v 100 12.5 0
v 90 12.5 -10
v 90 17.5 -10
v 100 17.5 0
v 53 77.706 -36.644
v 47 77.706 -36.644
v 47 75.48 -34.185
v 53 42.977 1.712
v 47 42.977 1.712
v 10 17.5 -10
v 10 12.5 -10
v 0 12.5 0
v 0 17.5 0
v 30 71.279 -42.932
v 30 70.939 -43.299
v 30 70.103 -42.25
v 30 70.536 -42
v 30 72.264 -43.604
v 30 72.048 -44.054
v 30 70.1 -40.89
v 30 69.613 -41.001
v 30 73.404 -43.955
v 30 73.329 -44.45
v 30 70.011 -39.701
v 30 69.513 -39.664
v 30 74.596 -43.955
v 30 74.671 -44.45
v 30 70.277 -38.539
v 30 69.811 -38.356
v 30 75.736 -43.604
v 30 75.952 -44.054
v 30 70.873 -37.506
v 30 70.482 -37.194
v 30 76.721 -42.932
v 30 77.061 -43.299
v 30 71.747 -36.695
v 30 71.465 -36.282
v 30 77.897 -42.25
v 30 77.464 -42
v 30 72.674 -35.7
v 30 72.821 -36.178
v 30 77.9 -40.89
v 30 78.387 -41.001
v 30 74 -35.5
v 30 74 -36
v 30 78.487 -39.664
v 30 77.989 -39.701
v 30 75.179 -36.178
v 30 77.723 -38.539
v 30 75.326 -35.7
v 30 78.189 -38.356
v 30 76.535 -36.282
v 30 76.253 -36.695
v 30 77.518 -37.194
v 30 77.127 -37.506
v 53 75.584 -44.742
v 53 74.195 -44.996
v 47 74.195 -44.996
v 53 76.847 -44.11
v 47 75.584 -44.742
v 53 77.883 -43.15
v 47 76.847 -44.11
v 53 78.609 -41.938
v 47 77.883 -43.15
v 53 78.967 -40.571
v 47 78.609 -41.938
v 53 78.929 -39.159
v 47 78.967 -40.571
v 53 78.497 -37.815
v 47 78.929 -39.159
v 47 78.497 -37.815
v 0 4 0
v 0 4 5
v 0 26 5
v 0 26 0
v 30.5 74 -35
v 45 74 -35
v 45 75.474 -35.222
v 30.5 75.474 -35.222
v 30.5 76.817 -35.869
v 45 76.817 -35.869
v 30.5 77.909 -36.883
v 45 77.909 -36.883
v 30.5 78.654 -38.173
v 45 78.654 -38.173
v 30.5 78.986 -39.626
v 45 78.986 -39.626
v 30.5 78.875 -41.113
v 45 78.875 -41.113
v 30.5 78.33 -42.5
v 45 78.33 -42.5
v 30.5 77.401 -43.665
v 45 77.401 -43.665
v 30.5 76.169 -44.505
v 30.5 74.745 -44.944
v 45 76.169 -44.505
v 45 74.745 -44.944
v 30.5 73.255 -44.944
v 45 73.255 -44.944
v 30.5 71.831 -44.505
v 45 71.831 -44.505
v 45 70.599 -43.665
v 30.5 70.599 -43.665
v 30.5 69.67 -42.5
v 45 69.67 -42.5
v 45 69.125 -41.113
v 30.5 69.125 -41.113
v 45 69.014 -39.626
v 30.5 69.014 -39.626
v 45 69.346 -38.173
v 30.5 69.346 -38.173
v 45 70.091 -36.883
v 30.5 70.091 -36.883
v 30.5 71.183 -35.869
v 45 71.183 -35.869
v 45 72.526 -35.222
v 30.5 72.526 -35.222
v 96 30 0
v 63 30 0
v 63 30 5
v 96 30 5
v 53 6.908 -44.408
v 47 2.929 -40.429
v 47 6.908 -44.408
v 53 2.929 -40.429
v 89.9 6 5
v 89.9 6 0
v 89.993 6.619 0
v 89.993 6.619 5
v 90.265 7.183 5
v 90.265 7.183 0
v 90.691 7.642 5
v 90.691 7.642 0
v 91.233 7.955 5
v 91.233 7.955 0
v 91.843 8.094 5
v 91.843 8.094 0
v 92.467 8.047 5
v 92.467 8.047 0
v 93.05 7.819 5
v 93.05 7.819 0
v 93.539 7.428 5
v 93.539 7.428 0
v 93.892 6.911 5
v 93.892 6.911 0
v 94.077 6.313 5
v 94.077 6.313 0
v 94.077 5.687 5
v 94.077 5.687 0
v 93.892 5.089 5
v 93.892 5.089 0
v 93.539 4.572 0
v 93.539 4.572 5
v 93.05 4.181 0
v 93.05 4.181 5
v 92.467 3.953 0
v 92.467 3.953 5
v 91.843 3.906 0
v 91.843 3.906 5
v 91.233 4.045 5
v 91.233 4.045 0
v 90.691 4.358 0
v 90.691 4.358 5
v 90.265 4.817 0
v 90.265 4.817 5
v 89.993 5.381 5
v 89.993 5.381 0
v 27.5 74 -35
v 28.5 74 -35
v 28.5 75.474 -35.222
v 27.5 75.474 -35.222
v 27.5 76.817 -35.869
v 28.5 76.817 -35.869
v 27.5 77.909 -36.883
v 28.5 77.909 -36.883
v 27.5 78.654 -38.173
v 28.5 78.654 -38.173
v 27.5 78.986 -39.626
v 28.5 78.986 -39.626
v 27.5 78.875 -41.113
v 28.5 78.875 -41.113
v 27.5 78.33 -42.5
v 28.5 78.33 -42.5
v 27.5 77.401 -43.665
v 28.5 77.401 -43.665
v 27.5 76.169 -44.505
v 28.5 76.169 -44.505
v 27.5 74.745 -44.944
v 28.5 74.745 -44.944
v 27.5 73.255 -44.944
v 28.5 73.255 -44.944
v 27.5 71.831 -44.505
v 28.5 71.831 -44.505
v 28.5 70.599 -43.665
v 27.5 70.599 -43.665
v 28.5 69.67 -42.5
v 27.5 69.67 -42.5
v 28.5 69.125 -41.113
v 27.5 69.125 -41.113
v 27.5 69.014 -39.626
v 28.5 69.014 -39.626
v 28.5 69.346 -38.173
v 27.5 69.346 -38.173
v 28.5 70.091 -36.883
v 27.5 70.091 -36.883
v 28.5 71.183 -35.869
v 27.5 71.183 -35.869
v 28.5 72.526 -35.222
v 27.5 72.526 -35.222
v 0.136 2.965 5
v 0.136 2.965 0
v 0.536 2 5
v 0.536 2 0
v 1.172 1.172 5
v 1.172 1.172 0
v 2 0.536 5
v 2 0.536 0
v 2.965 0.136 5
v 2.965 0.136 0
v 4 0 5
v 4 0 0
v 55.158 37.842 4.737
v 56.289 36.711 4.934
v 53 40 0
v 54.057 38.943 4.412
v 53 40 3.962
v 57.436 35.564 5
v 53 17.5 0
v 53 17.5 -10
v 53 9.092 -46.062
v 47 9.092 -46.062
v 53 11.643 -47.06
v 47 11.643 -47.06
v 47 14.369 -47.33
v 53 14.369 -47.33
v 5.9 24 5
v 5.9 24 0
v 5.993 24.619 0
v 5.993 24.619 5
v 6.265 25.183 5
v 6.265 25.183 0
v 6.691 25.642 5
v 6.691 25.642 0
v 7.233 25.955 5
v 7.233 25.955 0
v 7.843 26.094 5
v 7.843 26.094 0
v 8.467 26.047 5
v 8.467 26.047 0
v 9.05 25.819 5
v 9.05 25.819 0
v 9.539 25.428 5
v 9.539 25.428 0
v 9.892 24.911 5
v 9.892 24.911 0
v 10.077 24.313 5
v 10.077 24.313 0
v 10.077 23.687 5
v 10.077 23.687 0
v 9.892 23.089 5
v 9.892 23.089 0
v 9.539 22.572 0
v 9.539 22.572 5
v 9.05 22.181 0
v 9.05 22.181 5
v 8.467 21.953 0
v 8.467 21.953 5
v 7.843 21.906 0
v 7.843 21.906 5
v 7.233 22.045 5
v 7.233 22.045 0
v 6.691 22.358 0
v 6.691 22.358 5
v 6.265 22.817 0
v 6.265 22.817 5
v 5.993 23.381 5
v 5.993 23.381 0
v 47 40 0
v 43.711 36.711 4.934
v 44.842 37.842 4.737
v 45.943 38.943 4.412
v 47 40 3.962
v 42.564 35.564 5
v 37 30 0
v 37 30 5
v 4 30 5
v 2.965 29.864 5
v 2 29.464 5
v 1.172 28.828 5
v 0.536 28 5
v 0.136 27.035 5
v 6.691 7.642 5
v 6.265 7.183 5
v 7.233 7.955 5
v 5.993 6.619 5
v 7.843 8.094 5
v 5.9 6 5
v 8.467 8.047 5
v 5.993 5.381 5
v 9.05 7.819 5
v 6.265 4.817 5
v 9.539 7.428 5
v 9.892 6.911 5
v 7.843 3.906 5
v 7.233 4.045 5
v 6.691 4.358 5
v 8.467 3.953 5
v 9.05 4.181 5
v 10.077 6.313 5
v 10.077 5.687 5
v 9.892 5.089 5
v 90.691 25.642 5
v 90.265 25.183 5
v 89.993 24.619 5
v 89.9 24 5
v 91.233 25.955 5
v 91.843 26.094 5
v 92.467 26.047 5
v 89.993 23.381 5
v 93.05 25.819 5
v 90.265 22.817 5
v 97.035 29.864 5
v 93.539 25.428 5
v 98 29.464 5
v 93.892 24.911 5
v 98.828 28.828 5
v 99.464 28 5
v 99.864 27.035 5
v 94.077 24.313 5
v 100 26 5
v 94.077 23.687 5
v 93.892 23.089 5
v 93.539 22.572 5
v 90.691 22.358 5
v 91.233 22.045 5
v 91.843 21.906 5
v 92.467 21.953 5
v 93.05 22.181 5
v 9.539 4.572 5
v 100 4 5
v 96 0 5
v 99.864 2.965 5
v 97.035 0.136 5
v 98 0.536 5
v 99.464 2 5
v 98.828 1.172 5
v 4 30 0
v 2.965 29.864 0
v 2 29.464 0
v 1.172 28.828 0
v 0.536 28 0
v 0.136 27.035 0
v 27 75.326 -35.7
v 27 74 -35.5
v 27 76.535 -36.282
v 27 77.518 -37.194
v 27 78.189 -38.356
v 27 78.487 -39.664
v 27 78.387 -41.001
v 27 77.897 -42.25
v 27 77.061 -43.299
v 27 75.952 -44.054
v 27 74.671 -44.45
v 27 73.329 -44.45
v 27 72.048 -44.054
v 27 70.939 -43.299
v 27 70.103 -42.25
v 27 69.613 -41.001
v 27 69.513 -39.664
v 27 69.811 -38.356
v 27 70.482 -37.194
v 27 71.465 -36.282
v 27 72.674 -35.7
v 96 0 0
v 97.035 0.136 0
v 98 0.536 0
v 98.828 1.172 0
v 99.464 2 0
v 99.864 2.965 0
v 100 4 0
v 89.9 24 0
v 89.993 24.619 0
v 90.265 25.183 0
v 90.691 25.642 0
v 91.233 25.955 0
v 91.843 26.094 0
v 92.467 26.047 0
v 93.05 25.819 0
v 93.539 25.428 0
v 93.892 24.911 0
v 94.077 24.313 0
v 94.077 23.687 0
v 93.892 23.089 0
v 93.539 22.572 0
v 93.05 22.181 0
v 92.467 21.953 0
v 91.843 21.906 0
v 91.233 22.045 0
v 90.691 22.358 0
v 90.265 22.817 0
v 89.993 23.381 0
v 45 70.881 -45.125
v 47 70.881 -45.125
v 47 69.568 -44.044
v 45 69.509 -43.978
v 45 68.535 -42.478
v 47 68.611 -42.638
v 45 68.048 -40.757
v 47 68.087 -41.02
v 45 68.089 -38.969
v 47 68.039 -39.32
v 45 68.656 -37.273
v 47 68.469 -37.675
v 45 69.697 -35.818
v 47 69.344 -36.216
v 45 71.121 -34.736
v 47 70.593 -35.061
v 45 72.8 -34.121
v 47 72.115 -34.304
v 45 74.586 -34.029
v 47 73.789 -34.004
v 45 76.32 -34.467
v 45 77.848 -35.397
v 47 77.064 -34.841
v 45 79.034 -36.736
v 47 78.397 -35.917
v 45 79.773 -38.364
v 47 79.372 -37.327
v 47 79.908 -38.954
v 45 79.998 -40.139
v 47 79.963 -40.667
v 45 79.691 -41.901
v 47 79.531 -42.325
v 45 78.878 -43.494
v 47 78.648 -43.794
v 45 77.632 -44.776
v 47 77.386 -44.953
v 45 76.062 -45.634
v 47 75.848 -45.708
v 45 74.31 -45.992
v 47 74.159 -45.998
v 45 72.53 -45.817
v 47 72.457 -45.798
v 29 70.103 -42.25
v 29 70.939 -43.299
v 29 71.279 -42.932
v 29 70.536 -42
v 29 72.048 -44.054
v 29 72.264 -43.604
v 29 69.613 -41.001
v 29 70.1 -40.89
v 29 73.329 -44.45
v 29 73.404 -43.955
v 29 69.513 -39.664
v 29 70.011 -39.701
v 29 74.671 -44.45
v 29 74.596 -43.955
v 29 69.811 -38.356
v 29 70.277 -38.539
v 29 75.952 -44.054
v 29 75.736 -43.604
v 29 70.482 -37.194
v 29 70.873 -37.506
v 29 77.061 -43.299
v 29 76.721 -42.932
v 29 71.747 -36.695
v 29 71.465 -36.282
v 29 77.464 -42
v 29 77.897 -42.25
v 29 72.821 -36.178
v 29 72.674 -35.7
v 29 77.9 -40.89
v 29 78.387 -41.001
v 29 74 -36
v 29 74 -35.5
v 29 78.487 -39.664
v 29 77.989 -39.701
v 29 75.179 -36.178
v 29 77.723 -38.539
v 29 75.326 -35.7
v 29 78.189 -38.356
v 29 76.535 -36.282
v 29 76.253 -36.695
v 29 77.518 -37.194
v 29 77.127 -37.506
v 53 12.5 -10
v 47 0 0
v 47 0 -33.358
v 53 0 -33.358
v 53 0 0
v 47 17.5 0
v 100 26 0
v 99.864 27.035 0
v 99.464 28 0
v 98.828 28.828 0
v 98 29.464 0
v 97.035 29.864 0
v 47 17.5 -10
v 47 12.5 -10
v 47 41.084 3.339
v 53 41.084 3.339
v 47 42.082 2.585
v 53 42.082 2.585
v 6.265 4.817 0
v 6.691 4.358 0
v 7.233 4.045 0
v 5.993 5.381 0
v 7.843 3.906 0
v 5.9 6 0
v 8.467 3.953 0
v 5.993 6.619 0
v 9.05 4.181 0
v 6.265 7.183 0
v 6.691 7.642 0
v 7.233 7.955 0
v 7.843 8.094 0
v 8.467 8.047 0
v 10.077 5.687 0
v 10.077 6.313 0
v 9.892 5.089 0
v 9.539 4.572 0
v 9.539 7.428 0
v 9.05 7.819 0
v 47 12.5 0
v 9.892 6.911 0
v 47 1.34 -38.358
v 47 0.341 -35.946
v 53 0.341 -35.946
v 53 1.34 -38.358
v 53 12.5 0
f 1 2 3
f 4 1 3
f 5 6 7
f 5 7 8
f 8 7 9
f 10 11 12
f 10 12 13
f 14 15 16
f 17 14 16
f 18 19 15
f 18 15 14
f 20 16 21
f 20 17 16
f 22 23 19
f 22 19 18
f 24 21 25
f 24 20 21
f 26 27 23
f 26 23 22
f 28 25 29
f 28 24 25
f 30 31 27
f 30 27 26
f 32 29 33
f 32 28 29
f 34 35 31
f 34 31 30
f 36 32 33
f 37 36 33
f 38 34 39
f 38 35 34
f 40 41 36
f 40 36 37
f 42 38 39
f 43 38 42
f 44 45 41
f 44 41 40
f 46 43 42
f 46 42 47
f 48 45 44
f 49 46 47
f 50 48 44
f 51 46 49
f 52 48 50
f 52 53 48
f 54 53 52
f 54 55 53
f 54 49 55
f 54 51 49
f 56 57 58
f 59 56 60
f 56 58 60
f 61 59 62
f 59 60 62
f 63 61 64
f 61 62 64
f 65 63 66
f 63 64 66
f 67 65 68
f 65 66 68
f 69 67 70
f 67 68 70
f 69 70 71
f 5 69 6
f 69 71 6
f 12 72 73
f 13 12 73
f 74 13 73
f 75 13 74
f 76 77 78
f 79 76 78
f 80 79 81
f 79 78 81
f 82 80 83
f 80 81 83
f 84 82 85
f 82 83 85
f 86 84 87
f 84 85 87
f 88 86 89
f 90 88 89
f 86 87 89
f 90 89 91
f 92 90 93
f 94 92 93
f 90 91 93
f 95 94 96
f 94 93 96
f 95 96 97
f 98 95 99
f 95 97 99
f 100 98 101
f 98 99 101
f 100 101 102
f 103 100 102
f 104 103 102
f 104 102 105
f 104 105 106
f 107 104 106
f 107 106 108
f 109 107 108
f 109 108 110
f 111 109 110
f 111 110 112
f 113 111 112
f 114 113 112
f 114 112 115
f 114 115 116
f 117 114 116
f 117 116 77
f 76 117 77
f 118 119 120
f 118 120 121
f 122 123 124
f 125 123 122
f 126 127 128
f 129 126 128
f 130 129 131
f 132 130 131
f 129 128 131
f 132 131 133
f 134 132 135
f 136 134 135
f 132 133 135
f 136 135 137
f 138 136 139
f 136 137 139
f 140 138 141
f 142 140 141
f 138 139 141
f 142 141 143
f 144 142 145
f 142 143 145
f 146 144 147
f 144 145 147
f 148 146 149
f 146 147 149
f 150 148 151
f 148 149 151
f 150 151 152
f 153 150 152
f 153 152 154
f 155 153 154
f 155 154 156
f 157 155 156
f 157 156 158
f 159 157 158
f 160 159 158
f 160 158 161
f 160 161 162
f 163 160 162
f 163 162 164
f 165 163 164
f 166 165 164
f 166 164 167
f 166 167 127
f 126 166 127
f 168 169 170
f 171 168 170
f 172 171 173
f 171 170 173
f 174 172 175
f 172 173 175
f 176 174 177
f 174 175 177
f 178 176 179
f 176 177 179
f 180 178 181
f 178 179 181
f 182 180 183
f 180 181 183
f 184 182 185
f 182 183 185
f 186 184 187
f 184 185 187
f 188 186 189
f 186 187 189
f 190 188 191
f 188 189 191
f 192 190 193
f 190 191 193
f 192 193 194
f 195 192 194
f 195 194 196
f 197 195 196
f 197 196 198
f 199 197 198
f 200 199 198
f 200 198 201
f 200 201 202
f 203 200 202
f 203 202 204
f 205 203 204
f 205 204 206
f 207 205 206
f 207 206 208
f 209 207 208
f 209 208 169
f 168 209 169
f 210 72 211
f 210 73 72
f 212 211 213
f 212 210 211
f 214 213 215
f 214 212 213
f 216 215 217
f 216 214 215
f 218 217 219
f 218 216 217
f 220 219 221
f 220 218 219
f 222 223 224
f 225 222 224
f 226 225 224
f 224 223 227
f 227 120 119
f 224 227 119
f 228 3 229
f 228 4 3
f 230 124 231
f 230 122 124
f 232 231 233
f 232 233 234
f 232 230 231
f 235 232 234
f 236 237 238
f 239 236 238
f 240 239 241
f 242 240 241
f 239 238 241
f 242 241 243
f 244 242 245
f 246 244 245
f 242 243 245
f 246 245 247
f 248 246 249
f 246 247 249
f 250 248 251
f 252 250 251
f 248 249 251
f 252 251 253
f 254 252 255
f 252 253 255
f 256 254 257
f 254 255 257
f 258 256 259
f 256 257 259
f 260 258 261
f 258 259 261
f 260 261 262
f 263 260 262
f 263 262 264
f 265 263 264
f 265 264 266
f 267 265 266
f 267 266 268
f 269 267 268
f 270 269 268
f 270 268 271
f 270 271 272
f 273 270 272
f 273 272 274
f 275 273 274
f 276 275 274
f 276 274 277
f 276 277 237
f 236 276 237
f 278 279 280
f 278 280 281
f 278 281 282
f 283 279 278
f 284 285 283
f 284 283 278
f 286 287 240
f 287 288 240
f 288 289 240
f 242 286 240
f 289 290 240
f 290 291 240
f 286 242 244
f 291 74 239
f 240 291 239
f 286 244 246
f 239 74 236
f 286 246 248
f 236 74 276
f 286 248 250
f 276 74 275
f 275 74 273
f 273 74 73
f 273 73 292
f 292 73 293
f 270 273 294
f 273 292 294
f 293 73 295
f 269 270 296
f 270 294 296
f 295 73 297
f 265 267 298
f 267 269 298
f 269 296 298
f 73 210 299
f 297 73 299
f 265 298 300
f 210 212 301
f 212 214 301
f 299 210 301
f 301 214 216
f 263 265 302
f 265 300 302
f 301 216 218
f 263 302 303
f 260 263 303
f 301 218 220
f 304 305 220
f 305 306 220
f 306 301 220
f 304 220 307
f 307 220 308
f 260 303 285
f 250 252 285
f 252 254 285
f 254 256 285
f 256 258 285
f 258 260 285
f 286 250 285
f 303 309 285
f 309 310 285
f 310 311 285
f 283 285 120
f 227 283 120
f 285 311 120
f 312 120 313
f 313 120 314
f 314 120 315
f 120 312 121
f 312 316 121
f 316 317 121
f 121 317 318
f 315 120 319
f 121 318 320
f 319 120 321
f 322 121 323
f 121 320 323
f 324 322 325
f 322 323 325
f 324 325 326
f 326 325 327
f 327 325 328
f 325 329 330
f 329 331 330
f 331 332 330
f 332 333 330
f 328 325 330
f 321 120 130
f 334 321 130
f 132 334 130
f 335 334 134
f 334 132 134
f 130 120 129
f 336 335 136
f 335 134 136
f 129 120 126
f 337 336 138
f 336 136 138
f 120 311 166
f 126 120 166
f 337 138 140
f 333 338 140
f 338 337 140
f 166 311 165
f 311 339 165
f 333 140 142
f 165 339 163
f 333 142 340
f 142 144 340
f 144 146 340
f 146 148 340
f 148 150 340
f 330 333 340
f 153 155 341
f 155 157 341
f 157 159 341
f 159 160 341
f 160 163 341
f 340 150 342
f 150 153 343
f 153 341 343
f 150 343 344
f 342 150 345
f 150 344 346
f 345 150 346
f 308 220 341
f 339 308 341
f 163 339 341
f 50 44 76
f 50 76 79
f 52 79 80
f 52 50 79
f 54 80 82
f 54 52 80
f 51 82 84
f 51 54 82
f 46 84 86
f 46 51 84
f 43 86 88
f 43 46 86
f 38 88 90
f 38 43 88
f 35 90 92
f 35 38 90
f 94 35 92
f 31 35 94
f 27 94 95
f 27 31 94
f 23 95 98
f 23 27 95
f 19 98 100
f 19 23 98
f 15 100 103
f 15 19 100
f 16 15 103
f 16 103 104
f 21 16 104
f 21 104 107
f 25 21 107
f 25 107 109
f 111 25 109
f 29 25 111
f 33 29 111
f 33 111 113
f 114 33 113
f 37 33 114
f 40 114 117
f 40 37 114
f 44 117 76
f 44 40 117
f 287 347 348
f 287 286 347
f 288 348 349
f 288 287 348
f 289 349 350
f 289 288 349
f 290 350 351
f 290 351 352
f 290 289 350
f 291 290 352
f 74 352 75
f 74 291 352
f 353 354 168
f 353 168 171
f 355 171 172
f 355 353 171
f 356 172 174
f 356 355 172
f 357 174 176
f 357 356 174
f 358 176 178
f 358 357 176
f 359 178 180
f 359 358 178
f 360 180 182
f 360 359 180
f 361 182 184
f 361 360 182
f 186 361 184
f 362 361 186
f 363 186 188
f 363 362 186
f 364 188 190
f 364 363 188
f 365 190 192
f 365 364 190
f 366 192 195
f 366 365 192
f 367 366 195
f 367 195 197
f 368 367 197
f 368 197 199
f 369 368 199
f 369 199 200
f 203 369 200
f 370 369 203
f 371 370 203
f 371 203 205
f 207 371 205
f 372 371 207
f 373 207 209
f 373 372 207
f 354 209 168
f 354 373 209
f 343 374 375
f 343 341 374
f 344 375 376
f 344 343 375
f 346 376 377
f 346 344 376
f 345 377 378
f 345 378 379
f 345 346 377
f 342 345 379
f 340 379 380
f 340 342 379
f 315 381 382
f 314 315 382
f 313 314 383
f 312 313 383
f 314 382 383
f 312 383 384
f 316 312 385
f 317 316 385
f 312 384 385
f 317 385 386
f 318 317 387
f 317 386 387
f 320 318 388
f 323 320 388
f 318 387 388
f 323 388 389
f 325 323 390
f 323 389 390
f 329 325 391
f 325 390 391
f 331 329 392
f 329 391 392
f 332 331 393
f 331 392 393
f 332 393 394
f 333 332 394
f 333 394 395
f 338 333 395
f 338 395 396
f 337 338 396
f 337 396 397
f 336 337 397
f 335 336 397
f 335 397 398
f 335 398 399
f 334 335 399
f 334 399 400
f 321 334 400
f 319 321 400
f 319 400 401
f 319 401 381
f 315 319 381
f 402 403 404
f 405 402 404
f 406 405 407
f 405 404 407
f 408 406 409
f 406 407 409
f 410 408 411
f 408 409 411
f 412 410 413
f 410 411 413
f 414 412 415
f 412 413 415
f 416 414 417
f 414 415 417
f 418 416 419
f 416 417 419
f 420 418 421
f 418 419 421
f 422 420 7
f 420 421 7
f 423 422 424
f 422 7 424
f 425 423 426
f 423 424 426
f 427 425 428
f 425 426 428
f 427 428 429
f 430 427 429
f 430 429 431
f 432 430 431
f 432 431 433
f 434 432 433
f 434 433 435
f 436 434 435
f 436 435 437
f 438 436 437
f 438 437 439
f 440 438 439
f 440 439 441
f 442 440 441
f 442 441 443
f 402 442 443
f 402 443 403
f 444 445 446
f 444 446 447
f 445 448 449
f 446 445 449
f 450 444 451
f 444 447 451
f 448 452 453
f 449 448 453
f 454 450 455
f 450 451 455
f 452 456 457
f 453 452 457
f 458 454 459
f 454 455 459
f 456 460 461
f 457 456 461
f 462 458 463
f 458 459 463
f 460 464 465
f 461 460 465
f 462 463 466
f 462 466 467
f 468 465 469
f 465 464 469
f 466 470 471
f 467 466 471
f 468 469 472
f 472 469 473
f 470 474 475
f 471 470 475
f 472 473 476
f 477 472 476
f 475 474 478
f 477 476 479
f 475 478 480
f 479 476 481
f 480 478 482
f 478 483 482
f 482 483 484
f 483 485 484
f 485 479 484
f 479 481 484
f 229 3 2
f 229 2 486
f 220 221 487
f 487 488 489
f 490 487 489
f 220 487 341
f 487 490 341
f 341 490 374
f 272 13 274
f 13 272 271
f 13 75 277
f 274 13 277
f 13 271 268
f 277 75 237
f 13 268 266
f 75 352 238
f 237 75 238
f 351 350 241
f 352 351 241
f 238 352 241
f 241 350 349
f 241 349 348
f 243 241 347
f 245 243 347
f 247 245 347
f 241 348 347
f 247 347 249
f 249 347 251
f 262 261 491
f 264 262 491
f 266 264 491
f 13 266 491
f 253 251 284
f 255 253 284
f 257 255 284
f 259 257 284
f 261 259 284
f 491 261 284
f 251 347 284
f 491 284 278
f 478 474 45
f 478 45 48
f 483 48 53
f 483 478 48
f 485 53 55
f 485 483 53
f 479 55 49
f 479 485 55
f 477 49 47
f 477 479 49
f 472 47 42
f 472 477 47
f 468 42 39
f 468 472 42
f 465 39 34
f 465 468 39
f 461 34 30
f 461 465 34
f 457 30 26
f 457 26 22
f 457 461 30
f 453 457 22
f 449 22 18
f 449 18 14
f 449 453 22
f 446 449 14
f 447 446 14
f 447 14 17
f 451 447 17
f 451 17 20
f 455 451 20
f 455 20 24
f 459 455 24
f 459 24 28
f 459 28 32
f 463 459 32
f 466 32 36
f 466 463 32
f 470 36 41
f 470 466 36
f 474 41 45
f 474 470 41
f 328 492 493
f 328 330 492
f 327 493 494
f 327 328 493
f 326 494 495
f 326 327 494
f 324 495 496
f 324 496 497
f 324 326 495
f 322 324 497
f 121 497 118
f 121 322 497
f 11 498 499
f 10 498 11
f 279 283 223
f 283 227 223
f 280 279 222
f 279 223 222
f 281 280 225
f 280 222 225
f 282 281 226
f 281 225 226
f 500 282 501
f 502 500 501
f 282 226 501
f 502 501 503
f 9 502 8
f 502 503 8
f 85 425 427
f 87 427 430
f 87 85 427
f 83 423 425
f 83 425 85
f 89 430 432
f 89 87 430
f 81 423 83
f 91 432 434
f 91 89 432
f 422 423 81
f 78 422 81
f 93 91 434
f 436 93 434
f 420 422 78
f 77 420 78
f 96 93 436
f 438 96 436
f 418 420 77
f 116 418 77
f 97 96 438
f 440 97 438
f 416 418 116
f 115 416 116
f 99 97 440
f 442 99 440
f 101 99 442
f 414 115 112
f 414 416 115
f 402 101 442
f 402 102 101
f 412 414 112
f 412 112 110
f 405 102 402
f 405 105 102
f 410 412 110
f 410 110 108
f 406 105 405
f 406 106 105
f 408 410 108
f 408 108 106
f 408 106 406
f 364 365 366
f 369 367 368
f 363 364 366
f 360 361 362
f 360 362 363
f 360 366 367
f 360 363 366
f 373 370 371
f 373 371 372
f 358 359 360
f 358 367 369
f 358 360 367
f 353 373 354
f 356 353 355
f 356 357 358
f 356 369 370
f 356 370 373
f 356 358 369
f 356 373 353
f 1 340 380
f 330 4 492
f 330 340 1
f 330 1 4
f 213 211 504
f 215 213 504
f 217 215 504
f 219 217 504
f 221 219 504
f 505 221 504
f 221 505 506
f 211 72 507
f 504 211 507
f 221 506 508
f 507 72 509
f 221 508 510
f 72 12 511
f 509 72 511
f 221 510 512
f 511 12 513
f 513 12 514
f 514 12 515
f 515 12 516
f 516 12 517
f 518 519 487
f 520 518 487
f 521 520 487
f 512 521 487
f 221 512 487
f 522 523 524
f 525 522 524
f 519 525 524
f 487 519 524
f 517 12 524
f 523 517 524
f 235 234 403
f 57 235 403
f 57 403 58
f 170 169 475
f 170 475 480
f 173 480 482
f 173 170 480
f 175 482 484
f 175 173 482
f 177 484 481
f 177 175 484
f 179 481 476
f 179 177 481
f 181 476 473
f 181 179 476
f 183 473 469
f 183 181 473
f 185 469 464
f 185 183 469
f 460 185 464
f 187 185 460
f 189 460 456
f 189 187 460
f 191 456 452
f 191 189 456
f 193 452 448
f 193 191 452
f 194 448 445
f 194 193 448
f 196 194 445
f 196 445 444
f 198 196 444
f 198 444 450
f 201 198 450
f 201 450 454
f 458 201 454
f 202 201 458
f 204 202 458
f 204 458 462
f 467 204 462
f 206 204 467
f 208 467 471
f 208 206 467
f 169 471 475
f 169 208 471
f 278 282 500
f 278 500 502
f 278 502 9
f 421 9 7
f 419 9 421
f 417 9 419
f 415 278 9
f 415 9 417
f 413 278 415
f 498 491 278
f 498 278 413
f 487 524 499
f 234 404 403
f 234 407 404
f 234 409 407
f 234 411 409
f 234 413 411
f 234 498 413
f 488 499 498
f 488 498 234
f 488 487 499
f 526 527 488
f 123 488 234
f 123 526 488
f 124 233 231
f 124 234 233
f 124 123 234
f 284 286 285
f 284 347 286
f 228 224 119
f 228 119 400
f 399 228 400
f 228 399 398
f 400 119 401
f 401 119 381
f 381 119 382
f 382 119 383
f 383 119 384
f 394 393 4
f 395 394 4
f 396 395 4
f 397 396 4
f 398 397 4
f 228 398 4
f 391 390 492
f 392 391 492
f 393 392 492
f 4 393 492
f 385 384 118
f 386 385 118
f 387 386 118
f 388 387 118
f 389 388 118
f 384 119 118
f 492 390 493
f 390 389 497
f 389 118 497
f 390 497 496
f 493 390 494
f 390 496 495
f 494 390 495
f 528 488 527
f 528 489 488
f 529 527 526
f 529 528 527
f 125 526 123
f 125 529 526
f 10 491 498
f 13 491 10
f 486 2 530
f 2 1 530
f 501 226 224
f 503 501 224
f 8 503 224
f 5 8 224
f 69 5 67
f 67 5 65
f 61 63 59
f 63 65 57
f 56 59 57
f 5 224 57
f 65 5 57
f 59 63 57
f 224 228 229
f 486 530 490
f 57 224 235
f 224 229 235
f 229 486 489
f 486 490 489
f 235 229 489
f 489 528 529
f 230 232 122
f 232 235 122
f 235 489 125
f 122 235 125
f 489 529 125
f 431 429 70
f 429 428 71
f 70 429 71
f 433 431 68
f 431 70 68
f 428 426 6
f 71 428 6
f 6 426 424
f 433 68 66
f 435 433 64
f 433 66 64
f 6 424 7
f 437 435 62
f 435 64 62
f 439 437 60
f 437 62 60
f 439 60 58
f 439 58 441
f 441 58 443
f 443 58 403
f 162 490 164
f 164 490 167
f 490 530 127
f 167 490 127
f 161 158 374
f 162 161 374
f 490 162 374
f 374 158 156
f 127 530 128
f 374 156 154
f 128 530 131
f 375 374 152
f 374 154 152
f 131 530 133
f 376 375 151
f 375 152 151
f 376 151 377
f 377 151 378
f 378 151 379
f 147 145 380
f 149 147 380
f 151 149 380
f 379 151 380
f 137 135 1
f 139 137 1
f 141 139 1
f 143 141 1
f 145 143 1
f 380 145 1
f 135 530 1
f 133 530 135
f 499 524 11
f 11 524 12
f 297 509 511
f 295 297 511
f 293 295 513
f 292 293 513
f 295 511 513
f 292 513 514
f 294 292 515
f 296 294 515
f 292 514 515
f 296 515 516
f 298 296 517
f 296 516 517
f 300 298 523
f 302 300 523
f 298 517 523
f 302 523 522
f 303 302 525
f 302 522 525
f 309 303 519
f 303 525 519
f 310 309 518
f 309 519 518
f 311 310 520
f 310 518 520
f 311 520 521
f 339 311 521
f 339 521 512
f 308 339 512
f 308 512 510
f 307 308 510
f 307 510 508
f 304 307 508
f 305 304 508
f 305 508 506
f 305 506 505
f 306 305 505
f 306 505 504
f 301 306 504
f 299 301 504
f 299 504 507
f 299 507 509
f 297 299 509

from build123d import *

# Parameters (mm, degrees)
SKETCH1_W           = 100
SKETCH1_H           = 30
BOSS_EXTRUDE1_DEPTH = 5
SKETCH2_W           = 6
SKETCH2_H           = 50
BOSS_EXTRUDE2_DEPTH = 30
SKETCH3_W           = 6
SKETCH3_H           = 52.5
BOSS_EXTRUDE3_DEPTH = 50
SKETCH4_R           = 5
BOSS_EXTRUDE4_DEPTH = 20
CHAMFER1_SIZE       = 10
FILLET1_R           = 10
CHAMFER2_SIZE       = 10
FILLET2_R           = 4
SKETCH5_W           = 100
SKETCH5_H           = 5
BOSS_EXTRUDE5_DEPTH = 10
CHAMFER3_SIZE       = 10
SKETCH7_R           = 2.1
CUT_EXTRUDE1_DEPTH  = 137.587883796
CUT_EXTRUDE2_DEPTH  = 108.075907654
FILLET3_R           = 10
SKETCH9_R           = 6
BOSS_EXTRUDE6_DEPTH = 2
CHAMFER4_SIZE       = 0.5
CUT_EXTRUDE3_START  = 1
SKETCH10_R          = 5
SKETCH10_R_2        = 4
CUT_EXTRUDE3_DEPTH  = 1
CHAMFER5_SIZE       = 0.5


with BuildPart() as part:
    # Sketch1 → Boss-Extrude1 (new body)
    with BuildSketch(Plane.XY):
        with Locations((50, 15)):
            Rectangle(SKETCH1_W, SKETCH1_H)
    extrude(amount=BOSS_EXTRUDE1_DEPTH)

    # Sketch2 → Boss-Extrude2 (add)
    with BuildSketch(Plane(origin=(0, 30, 0), x_dir=(1, 0, 0), z_dir=(0, 1, 0))):
        with Locations((50, 22.5)):
            Rectangle(SKETCH2_W, SKETCH2_H)
    extrude(amount=-BOSS_EXTRUDE2_DEPTH)

    # Sketch3 → Boss-Extrude3 (add)
    with BuildSketch(Plane(origin=(0, 30, 0), x_dir=(1, 0, 0), z_dir=(0, 1, 0))):
        with Locations((50, 21.25)):
            Rectangle(SKETCH3_W, SKETCH3_H)
    extrude(amount=BOSS_EXTRUDE3_DEPTH)

    # Sketch4 → Boss-Extrude4 (add)
    with BuildSketch(Plane.ZY.offset(-47)):
        with Locations((-40, 74)):
            Circle(SKETCH4_R)
    extrude(amount=BOSS_EXTRUDE4_DEPTH)

    # Chamfer1
    chamfer1_edges = [part.edges().sort_by_distance(p)[0] for p in [
        (50, 0, -47.5),
    ]]
    chamfer(chamfer1_edges, length=CHAMFER1_SIZE)

    # Fillet1
    fillet1_edges = [part.edges().sort_by_distance(p)[0] for p in [
        (50, 80, 5),
        (50, 80, -47.5),
    ]]
    fillet(fillet1_edges, radius=FILLET1_R)

    # Chamfer2
    chamfer2_edges = [part.edges().sort_by_distance(p)[0] for p in [
        (47, 30, 2.5),
        (53, 30, 2.5),
    ]]
    chamfer(chamfer2_edges, length=CHAMFER2_SIZE)

    # Fillet2
    fillet2_edges = [part.edges().sort_by_distance(p)[0] for p in [
        (0, 0, 2.5),
        (100, 0, 2.5),
        (100, 30, 2.5),
        (0, 30, 2.5),
    ]]
    fillet(fillet2_edges, radius=FILLET2_R)

    # Sketch5 → Boss-Extrude5 (add)
    with BuildSketch(Plane(origin=(0, 0, 0), x_dir=(-1, 0, 0), z_dir=(0, 0, -1))):
        with Locations((-50, 15)):
            Rectangle(SKETCH5_W, SKETCH5_H)
    extrude(amount=BOSS_EXTRUDE5_DEPTH)

    # Chamfer3
    chamfer3_edges = [part.edges().sort_by_distance(p)[0] for p in [
        (0, 15, -10),
        (100, 15, -10),
    ]]
    chamfer(chamfer3_edges, length=CHAMFER3_SIZE)

    # Sketch7 → Cut-Extrude1 (cut, through all)
    with BuildSketch(Plane(origin=(0, 0, 0), x_dir=(-1, 0, 0), z_dir=(0, 0, -1))):
        with Locations((-92, 24)):
            Circle(SKETCH7_R)
        with Locations((-8, 24)):
            Circle(SKETCH7_R)
        with Locations((-8, 6)):
            Circle(SKETCH7_R)
        with Locations((-92, 6)):
            Circle(SKETCH7_R)
    extrude(amount=-CUT_EXTRUDE1_DEPTH, mode=Mode.SUBTRACT)

    # Sketch8 → Cut-Extrude2 (cut, through all)
    with BuildSketch(Plane.ZY.offset(-47)):
        with BuildLine():
            Line((-36.644039957, 77.706417703), (5, 40))
            Line((5, 40), (5, 70))
            ThreePointArc((5, 70), (2.071067812, 77.071067812), (-5, 80))
            Line((-5, 80), (-37.5, 80))
            ThreePointArc((-37.5, 80), (-44.571067812, 77.071067812), (-47.5, 70))
            Line((-47.5, 70), (-47.5, 10))
            Line((-47.5, 10), (-44.996201229, 74.194867332))
            ThreePointArc((-44.996201229, 74.194867332), (-41.937871072, 78.609192522), (-36.644039957, 77.706417703))
        make_face()
    extrude(amount=-CUT_EXTRUDE2_DEPTH, mode=Mode.SUBTRACT)

    # Fillet3
    fillet3_edges = [part.edges().sort_by_distance(p)[0] for p in [
        (50, 40, 5),
        (50, 0, -37.5),
        (50, 10, -47.5),
    ]]
    fillet(fillet3_edges, radius=FILLET3_R)

    # Sketch9 → Boss-Extrude6 (add)
    with BuildSketch(Plane.ZY.offset(-47)):
        with Locations(Location((-40, 74, 0), (0, 0, 211.323728943))):
            Circle(SKETCH9_R)
    extrude(amount=BOSS_EXTRUDE6_DEPTH)

    # Chamfer4
    chamfer4_edges = [part.edges().sort_by_distance(p)[0] for p in [
        (27, 74, -45),
    ]]
    chamfer(chamfer4_edges, length=CHAMFER4_SIZE)

    # Sketch10 → Cut-Extrude3 (cut)
    with BuildSketch(Plane.ZY.offset(-30).offset(CUT_EXTRUDE3_START)):
        with Locations((-40, 74)):
            Circle(SKETCH10_R)
        with Locations((-40, 74)):
            Circle(SKETCH10_R_2, mode=Mode.SUBTRACT)
    extrude(amount=-CUT_EXTRUDE3_DEPTH, mode=Mode.SUBTRACT)

    # Chamfer5
    chamfer5_edges = [part.edges().sort_by_distance(p)[0] for p in [
        (29, 74, -45),
        (30, 74, -45),
    ]]
    chamfer(chamfer5_edges, length=CHAMFER5_SIZE)


solid = part.part
